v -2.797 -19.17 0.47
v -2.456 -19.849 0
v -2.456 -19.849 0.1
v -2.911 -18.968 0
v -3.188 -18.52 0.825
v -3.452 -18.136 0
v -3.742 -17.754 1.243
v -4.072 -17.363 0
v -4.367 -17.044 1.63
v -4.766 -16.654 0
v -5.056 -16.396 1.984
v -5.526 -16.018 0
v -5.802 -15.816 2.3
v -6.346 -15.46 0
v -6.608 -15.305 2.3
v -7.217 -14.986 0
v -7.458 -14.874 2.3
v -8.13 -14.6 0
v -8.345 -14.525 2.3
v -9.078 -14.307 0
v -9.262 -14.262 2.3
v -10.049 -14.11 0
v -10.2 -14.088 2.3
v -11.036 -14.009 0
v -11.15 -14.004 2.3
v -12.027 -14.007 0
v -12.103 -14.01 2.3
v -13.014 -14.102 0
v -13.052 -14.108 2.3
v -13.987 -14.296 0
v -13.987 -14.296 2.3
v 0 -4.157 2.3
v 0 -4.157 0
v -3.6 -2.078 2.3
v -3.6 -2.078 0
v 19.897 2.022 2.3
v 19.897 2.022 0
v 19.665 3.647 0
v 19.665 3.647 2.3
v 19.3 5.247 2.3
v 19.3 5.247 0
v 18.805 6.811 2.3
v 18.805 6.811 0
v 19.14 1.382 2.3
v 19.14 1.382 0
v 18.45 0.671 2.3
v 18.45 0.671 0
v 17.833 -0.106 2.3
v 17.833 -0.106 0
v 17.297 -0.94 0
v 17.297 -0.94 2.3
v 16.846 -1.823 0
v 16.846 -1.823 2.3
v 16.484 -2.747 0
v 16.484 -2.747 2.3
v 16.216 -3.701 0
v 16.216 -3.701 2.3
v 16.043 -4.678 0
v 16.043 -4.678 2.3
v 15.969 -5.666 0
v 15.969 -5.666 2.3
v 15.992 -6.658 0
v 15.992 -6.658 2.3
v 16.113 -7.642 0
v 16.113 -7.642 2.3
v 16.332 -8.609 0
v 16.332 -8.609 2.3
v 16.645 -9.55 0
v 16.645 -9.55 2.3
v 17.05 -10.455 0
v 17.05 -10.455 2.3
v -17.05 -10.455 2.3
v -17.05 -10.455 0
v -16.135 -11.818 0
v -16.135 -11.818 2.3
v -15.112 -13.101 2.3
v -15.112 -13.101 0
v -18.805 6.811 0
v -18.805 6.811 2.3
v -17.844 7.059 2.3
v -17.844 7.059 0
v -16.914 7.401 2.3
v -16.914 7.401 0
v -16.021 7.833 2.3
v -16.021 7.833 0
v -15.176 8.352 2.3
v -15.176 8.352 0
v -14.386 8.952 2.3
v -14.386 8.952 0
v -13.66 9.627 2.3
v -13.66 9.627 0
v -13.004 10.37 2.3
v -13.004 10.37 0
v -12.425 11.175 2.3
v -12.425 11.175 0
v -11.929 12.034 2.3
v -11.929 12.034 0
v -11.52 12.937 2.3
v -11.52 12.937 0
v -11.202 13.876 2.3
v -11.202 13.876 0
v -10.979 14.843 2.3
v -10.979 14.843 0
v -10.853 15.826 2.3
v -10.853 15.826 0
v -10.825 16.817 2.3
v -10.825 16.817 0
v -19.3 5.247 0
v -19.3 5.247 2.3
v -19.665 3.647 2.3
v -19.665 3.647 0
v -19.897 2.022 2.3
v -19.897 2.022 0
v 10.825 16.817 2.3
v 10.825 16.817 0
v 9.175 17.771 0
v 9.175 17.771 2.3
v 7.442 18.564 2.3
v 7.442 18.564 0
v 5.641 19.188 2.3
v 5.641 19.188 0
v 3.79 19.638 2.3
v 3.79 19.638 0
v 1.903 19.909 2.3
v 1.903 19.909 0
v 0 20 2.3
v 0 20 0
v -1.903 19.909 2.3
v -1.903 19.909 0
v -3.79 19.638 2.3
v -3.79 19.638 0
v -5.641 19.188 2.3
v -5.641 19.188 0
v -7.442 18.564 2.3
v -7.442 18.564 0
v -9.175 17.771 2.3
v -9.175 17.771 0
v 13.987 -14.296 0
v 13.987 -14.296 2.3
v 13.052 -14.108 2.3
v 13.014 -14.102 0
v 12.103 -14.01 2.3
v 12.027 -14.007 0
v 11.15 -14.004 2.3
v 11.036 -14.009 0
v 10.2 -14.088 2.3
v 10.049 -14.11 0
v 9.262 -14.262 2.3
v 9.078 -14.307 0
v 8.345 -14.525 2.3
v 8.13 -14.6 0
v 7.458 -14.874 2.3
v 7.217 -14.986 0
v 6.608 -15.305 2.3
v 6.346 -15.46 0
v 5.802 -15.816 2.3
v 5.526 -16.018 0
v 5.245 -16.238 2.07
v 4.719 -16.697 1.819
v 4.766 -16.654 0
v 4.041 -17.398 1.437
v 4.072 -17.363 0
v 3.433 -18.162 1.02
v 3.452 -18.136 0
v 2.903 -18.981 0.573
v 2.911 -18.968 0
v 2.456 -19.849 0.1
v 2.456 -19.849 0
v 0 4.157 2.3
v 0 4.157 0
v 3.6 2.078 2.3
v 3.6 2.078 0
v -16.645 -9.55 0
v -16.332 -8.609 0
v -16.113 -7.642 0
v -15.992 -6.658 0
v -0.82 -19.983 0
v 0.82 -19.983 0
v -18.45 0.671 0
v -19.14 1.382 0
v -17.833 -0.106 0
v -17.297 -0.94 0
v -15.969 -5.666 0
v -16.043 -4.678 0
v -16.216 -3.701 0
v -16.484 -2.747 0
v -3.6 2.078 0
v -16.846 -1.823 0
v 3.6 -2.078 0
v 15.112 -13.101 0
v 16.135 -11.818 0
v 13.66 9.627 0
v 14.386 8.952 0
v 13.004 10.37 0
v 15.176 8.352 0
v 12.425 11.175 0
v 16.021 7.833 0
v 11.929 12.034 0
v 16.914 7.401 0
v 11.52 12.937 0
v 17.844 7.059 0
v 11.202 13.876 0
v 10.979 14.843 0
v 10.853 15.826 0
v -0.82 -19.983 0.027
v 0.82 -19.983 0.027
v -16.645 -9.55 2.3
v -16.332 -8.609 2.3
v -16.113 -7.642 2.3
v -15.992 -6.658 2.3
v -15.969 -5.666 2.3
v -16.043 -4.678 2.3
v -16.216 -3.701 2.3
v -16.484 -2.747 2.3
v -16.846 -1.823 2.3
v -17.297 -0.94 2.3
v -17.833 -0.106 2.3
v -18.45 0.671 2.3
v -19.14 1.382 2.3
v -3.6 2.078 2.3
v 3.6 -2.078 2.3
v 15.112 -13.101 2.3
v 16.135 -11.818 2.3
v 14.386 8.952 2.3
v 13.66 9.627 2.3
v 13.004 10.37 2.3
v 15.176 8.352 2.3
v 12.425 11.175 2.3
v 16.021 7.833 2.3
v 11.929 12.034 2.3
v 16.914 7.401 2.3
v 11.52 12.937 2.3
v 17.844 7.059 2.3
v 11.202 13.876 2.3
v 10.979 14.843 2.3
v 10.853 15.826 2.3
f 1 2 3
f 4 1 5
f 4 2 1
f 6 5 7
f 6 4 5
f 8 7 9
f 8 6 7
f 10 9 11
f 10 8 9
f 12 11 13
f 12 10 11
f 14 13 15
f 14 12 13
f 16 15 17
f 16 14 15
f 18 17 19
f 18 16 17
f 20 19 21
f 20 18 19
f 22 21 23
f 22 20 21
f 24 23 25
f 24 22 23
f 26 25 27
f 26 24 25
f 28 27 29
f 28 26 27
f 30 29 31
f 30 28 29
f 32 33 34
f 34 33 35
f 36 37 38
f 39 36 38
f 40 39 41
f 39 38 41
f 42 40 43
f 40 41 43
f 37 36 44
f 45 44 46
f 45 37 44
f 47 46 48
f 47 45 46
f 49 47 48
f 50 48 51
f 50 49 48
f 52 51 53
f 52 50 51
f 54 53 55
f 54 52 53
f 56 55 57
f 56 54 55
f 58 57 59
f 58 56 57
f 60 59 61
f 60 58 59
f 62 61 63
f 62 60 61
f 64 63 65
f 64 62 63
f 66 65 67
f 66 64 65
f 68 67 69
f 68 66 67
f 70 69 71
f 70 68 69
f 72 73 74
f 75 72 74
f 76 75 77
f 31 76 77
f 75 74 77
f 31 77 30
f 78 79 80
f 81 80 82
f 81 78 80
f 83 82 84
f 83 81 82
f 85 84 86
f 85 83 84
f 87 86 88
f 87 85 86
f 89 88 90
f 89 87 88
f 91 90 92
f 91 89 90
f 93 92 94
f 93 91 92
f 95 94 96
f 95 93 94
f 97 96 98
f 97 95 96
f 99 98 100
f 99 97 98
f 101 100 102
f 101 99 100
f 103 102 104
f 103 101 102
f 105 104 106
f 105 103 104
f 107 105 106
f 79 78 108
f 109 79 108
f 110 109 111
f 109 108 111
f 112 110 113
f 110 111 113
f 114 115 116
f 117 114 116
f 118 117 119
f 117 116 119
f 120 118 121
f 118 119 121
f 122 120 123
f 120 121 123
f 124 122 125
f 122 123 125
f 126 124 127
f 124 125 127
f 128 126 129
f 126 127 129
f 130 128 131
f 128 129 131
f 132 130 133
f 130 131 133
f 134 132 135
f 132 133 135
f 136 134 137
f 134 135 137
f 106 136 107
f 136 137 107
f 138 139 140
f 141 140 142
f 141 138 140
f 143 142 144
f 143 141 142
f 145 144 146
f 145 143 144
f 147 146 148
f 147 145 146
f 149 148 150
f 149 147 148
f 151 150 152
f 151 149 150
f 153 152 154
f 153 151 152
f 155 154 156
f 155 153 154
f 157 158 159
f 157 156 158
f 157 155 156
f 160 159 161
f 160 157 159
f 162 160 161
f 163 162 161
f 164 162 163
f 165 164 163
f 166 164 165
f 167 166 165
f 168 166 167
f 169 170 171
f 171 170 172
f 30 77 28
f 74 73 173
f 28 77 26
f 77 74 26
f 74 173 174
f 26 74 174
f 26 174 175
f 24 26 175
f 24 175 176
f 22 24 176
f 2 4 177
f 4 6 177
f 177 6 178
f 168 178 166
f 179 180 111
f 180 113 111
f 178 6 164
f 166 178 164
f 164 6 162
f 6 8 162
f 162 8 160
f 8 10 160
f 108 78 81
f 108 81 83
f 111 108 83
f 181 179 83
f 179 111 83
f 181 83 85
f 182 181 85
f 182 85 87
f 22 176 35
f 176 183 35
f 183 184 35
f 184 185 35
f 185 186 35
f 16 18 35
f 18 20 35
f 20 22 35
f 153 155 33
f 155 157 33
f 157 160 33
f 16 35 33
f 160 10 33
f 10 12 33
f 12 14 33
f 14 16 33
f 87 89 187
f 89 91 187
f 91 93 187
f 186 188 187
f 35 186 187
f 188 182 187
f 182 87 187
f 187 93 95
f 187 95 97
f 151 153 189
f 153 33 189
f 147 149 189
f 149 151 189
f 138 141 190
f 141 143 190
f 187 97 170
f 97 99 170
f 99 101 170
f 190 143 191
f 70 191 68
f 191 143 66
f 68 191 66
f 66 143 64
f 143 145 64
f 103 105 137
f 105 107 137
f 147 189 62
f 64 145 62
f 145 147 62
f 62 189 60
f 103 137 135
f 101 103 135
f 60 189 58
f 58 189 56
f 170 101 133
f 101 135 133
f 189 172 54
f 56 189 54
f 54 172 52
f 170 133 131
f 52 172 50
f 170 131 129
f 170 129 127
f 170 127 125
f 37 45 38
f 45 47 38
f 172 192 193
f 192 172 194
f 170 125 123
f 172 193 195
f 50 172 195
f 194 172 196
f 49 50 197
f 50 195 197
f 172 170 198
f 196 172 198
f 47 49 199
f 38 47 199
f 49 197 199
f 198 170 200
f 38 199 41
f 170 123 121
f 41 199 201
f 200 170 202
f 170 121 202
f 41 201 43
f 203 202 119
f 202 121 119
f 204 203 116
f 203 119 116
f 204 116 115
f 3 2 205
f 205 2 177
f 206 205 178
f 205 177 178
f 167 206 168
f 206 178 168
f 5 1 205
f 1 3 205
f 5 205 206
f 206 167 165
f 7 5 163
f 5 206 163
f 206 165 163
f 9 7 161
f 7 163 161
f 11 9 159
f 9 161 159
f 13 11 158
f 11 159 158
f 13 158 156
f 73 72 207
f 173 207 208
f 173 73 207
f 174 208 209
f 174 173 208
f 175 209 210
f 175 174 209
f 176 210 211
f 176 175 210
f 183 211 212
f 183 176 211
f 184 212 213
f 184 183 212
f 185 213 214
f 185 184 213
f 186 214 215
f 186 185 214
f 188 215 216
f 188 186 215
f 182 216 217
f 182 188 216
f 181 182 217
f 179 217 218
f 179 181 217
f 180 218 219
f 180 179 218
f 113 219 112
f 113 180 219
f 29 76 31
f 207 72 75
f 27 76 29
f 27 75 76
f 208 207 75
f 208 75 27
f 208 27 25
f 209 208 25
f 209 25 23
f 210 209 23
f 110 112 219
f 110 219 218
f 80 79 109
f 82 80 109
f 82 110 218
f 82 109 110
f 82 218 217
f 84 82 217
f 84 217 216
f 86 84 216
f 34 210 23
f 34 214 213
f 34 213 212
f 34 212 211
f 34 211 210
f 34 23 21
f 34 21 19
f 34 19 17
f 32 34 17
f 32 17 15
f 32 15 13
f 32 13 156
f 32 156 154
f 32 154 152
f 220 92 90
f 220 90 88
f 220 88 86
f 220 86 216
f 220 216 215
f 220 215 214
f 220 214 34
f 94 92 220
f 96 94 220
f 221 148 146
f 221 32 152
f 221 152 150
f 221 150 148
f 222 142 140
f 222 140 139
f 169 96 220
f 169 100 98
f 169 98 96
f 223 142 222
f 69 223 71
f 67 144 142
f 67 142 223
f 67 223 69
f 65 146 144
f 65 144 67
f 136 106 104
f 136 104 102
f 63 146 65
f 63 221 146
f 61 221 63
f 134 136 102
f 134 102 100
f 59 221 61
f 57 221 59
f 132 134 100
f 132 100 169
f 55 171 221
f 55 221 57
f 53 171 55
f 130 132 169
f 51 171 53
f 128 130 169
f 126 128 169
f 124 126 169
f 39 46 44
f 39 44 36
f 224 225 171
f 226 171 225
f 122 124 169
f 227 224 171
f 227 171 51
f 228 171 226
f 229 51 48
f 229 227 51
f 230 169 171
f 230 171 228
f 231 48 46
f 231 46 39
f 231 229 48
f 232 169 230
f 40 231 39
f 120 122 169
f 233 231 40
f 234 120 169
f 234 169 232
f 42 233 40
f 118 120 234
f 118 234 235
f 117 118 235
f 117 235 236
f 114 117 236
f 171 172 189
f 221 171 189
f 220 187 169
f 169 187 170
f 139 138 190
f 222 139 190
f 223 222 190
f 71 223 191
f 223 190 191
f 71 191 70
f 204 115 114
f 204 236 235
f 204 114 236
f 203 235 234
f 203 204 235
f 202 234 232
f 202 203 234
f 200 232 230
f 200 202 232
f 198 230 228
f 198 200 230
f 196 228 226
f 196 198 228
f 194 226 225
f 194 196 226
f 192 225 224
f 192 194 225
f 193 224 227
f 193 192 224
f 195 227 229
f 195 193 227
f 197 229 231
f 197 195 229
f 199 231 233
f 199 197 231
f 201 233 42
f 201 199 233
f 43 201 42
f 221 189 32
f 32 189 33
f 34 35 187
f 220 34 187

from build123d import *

# Parameters (mm, degrees)
F0_R     = 20
F1_DEPTH = 2.3
F2_R     = 10
F3_DEPTH = 2.301
F5_DEPTH = 6


with BuildPart() as f1:
    # F0 (on Top) → F1 (new body)
    with BuildSketch(Plane.XY):
        Circle(F0_R)
        Polygon((0, 4.1569219382), (3.6, 2.0784609691), (3.6, -2.0784609691), (0, -4.1569219382), (-3.6, -2.0784609691), (-3.6, 2.0784609691), align=None, mode=Mode.SUBTRACT)
    extrude(amount=F1_DEPTH)

    # F2 (on Top) → F3 (cut, through all)
    with BuildSketch(Plane.XY):
        with Locations((-20.8224465161, 16.605346988)):
            Circle(F2_R)
        with Locations((-25.9651661051, -5.926379725)):
            Circle(F2_R)
        with Locations((-11.5555860241, -23.9954216289)):
            Circle(F2_R)
        with Locations((11.5555860241, -23.9954216289)):
            Circle(F2_R)
        with Locations((25.9651661051, -5.926379725)):
            Circle(F2_R)
        with Locations((20.8224465161, 16.605346988)):
            Circle(F2_R)
    extrude(amount=F3_DEPTH, mode=Mode.SUBTRACT)

    # F4 (on Right) → F5 (cut, symmetric)
    with BuildSketch(Plane.YZ):
        Polygon((-20.0328639653, 3), (-20.0328639653, 0), (-14.5328639653, 3), align=None)
    extrude(amount=F5_DEPTH, both=True, mode=Mode.SUBTRACT)


solid = f1.part
